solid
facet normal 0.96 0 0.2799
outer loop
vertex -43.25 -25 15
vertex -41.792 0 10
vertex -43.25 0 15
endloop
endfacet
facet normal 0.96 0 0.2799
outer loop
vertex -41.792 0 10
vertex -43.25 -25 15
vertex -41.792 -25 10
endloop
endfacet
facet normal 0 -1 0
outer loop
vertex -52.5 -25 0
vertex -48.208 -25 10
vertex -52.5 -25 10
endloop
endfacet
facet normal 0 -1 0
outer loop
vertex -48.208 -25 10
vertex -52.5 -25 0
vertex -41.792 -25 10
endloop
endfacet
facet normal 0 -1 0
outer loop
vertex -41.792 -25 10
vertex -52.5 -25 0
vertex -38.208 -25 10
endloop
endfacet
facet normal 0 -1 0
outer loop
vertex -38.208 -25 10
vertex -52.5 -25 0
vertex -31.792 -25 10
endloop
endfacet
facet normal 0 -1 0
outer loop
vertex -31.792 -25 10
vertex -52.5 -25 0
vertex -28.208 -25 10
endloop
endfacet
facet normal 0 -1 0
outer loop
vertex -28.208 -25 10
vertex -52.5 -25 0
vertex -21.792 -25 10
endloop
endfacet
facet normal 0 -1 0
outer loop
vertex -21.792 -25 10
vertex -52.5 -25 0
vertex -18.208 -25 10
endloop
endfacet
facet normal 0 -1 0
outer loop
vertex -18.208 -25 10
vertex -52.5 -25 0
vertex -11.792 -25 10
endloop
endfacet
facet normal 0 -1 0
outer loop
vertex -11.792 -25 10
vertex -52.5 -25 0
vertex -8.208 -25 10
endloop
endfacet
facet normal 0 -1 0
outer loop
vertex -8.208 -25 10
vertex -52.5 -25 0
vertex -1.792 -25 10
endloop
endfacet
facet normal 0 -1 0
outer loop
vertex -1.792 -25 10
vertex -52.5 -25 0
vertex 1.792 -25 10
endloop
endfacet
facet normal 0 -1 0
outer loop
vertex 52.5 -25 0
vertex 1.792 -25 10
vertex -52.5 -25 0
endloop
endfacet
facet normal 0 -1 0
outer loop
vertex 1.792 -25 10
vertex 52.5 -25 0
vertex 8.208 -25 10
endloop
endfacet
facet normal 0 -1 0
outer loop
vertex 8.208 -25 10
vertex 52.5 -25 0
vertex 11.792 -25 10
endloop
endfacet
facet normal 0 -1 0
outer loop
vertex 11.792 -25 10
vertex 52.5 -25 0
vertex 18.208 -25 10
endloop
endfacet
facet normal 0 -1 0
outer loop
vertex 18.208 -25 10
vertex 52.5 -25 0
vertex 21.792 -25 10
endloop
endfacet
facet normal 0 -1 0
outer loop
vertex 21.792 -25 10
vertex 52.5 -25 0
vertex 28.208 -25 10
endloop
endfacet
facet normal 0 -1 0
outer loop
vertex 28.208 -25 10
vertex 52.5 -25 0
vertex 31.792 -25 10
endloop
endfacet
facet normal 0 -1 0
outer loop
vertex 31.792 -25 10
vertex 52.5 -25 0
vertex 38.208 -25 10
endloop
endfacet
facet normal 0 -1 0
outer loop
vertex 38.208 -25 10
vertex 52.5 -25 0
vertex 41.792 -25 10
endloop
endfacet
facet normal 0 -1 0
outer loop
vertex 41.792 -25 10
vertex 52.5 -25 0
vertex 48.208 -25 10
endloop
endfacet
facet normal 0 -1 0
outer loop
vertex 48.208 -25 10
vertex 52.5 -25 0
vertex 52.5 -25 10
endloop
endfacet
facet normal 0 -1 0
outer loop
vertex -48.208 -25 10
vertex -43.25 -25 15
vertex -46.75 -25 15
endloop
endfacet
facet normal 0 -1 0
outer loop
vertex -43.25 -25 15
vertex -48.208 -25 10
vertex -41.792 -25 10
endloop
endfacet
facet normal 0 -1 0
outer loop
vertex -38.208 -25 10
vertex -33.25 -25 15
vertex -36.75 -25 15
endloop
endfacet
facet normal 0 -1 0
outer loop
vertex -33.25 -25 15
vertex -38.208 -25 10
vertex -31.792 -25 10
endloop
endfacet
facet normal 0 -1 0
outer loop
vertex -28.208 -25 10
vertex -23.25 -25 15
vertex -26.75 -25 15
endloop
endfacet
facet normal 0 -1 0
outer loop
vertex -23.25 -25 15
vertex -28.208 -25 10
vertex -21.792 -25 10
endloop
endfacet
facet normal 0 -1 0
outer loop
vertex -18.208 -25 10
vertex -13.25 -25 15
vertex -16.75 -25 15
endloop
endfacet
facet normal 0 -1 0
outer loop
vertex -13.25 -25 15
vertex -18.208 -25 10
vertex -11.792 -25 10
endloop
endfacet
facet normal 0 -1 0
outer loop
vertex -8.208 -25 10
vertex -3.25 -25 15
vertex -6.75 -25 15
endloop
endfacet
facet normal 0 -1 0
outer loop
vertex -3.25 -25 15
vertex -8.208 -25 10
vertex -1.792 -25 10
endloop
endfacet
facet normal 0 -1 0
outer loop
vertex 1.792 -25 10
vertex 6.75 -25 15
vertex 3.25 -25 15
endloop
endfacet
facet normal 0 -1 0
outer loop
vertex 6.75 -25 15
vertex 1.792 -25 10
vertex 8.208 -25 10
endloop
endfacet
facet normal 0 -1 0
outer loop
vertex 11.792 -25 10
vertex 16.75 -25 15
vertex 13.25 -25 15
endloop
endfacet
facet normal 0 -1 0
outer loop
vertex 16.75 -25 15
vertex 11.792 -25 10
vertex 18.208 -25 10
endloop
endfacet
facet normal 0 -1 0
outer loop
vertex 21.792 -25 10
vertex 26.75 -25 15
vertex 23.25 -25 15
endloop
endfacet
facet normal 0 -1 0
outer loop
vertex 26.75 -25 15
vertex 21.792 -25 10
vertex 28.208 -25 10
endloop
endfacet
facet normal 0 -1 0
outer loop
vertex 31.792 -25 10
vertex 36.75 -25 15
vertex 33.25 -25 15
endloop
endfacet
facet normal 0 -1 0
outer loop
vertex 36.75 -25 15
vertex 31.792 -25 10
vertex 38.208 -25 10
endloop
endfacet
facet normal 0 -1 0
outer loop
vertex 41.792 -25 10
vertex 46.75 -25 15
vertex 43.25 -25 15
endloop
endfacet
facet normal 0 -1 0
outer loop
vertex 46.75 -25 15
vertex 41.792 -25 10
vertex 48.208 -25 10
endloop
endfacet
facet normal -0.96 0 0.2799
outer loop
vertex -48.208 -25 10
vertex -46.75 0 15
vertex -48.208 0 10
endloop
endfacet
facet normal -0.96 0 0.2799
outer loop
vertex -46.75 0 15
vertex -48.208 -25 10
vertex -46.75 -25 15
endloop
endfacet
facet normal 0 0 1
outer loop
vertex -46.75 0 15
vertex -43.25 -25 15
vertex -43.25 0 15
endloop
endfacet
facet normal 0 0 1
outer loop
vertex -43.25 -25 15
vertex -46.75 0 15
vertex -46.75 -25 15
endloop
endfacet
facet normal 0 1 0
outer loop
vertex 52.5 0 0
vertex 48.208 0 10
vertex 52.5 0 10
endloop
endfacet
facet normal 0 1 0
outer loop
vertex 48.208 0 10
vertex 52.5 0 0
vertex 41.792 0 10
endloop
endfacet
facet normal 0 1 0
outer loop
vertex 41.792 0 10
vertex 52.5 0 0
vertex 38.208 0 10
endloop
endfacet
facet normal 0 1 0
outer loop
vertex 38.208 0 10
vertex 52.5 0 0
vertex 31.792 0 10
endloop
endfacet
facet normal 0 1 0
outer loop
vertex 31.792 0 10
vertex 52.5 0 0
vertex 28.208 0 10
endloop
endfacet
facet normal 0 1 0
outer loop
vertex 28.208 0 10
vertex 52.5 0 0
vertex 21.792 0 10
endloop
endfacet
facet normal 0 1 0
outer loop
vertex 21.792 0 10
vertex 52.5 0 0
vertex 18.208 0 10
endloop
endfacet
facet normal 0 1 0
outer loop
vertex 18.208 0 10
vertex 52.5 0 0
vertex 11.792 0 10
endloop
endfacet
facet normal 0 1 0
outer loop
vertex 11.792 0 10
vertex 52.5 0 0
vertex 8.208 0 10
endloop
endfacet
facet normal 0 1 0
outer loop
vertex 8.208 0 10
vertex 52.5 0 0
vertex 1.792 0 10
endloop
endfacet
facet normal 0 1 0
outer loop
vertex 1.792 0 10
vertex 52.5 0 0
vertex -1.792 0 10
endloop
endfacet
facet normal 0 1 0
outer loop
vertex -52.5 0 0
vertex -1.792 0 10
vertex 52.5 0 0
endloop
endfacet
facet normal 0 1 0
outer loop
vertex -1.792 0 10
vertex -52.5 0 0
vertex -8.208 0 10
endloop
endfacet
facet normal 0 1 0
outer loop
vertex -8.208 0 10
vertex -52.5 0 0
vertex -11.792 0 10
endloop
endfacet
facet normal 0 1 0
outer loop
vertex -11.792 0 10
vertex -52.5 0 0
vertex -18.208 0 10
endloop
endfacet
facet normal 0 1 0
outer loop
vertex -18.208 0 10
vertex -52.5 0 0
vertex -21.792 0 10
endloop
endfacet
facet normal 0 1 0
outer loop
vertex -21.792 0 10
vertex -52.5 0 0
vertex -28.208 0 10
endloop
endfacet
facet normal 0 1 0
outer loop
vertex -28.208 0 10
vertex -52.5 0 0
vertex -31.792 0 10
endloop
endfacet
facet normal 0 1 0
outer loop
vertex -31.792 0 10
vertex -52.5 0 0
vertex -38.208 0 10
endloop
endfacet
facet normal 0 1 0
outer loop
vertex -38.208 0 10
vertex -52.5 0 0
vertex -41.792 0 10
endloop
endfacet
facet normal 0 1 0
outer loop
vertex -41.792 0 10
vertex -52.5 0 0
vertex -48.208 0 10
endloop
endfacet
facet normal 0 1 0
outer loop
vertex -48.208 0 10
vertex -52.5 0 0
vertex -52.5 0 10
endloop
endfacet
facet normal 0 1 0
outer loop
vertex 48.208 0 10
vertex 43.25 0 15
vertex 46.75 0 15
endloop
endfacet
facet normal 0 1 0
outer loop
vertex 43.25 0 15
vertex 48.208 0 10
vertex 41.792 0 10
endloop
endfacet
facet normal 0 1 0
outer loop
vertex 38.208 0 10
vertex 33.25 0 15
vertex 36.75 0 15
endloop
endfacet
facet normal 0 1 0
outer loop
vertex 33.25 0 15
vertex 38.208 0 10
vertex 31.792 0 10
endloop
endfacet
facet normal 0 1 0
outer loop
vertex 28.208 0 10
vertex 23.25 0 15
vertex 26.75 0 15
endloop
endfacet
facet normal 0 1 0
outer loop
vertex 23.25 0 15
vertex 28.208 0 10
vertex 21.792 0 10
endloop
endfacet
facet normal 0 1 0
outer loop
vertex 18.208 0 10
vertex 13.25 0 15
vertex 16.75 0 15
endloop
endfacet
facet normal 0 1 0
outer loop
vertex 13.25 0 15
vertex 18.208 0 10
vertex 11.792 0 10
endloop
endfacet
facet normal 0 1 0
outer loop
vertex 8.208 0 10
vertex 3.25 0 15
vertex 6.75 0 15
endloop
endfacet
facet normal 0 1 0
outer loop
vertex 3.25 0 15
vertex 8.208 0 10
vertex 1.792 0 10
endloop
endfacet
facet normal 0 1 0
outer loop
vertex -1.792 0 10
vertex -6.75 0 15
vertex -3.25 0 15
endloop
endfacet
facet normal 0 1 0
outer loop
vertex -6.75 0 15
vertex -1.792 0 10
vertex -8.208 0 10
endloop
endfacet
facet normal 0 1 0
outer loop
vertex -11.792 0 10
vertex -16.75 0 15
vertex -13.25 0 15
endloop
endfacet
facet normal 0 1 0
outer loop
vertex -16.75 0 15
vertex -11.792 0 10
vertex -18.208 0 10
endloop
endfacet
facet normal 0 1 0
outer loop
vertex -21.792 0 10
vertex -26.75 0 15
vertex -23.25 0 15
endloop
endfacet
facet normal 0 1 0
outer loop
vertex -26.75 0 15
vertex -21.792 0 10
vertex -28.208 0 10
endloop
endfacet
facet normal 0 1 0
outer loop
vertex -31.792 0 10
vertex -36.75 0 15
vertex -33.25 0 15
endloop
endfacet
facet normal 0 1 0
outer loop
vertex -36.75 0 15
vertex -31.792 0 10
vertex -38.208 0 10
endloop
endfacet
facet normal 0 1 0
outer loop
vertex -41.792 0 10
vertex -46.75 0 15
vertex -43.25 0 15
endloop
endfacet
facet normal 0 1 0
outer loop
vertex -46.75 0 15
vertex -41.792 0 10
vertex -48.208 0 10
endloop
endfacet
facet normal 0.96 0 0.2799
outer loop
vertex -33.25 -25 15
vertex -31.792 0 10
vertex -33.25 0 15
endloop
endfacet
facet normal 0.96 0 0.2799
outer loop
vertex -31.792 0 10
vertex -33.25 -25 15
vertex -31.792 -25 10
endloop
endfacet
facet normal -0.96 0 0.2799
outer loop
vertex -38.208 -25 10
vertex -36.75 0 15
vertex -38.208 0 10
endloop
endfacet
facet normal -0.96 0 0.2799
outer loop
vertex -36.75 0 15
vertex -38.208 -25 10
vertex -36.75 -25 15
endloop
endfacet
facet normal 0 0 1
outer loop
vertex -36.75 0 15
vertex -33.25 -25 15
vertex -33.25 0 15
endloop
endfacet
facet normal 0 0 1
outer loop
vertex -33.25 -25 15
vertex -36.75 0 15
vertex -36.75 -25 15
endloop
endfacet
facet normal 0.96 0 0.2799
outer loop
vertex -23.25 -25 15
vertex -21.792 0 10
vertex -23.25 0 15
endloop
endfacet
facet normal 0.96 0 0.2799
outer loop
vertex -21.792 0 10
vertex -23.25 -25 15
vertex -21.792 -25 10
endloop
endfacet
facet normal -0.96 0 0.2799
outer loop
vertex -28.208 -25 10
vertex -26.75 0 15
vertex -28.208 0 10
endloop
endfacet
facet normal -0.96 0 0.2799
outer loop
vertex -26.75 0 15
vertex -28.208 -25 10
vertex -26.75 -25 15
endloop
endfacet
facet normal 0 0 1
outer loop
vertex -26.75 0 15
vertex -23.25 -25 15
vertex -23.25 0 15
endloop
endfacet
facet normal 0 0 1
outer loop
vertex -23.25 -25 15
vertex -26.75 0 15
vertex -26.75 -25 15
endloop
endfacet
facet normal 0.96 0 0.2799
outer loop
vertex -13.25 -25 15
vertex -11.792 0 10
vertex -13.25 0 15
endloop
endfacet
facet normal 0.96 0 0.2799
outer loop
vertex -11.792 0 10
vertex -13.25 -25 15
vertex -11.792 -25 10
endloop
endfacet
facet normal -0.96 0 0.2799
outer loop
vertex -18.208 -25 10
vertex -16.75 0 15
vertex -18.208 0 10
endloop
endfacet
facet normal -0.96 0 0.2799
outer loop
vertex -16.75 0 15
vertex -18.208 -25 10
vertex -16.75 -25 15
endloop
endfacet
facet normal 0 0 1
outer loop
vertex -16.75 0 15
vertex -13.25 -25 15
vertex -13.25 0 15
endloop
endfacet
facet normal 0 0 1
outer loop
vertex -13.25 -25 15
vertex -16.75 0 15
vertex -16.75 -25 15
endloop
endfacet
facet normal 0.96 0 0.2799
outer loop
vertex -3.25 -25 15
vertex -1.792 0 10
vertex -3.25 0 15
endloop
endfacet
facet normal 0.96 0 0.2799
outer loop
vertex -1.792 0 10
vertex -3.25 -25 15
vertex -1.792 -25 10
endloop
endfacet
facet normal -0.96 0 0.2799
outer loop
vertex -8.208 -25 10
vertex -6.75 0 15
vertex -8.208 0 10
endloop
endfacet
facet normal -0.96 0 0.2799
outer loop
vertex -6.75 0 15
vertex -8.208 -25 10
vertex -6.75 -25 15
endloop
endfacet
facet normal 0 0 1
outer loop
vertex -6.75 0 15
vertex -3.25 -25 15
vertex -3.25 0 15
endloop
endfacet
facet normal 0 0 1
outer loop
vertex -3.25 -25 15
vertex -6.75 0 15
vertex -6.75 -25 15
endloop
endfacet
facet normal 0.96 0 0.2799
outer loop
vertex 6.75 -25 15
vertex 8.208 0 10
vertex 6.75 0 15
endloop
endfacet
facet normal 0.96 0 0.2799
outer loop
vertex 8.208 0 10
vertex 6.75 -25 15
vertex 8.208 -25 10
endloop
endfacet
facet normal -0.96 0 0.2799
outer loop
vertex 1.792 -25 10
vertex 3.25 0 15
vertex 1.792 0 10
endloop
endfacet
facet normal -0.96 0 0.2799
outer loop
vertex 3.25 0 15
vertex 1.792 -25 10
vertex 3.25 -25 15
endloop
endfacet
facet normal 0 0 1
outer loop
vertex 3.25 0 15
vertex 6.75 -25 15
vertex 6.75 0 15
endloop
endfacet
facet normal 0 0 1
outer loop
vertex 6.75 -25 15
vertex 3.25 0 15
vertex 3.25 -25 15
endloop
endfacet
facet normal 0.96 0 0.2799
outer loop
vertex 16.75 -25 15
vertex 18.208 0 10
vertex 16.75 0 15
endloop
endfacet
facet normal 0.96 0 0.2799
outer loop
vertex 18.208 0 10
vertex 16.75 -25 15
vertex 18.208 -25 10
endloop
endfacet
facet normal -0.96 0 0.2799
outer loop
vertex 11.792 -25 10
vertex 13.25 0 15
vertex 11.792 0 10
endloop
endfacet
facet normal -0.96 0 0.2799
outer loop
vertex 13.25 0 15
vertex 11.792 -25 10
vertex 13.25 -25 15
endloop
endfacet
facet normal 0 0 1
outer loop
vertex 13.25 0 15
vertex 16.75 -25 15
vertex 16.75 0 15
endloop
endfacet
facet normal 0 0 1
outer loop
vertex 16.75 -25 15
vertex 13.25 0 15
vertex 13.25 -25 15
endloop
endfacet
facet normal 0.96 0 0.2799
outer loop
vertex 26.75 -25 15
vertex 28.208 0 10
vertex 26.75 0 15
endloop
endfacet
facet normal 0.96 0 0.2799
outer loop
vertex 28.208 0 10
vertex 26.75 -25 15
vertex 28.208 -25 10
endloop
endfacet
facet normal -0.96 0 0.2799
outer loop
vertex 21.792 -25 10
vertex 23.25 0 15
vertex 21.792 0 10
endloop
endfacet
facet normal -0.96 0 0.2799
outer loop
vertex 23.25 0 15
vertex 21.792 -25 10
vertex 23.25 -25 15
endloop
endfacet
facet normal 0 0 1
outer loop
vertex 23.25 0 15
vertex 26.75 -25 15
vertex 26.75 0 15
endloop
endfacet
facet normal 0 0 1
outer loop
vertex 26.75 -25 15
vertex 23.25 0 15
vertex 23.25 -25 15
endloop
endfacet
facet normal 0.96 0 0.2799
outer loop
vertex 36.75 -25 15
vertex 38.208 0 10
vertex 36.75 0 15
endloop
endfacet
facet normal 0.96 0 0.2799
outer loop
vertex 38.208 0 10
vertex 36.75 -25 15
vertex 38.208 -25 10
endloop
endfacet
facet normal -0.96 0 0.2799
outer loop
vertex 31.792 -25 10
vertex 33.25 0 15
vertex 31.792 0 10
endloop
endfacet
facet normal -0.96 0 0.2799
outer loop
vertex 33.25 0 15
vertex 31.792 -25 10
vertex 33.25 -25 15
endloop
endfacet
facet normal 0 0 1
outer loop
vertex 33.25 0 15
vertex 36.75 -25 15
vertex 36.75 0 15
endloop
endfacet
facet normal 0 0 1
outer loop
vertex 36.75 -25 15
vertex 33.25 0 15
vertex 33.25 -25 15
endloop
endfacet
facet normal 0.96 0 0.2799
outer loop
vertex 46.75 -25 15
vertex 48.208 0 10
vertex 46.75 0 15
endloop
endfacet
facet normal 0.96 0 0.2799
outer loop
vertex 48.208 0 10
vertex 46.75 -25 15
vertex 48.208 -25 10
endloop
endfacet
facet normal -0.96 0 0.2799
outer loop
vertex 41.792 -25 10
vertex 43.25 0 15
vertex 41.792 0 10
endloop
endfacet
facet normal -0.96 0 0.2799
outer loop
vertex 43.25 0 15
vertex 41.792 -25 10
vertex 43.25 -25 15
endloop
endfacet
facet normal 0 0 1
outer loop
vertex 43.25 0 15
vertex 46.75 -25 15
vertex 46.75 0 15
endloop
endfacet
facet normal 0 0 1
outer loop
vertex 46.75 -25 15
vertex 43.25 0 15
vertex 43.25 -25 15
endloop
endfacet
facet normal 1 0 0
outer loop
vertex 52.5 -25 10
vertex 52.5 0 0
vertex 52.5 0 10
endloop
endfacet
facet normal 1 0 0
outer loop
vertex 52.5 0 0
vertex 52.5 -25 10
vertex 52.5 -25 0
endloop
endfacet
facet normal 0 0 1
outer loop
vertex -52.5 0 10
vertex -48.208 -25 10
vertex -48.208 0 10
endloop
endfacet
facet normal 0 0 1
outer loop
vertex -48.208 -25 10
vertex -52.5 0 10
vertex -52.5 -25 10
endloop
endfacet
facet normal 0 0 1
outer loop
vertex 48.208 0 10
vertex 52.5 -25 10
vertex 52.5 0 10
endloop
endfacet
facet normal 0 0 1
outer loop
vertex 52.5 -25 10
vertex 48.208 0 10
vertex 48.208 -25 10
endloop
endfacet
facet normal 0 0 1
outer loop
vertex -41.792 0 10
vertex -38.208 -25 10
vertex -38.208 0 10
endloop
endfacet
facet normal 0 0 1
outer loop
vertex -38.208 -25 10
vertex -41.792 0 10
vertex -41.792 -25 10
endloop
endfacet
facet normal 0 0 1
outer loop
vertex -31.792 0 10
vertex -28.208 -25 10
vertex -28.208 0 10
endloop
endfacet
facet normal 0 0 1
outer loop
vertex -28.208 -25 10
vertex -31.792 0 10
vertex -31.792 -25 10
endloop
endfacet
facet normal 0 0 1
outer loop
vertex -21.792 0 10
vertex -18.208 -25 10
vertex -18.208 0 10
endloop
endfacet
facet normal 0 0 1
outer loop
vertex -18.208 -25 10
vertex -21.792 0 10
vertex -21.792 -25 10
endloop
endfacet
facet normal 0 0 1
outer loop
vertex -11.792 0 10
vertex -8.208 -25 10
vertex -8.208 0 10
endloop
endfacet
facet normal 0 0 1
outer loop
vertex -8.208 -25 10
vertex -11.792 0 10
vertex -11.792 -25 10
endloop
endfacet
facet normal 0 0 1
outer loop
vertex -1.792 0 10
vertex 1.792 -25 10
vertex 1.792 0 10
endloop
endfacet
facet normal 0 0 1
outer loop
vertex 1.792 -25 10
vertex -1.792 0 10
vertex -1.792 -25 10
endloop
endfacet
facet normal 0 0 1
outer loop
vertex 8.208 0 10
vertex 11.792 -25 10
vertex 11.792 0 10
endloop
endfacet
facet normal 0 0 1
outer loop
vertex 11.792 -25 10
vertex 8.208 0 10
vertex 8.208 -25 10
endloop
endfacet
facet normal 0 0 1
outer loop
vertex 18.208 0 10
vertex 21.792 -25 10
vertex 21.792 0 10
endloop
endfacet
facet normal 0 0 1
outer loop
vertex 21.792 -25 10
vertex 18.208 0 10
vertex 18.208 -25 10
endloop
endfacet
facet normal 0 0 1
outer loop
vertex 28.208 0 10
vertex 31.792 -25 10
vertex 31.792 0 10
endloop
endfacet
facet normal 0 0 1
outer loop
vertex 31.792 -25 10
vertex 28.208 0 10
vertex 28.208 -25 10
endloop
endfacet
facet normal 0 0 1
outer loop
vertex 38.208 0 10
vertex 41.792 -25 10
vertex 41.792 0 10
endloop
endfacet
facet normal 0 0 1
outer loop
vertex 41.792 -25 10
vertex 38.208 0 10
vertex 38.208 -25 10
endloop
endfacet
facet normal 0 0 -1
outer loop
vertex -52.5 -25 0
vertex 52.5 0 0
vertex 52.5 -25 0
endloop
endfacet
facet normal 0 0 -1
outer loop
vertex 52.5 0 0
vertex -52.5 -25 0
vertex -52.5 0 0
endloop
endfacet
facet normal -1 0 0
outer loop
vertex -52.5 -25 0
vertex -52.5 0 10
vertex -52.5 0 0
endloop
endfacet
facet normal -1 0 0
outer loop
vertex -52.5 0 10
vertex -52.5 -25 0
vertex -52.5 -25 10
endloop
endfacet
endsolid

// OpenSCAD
$fn = 32;

// ----------------------------------------------------------------------
// Toothed rack, 10 teeth
// 10 mm pitch, 5 mm teeth
// ----------------------------------------------------------------------

// --- parameters (mm) ---
bar_w = 25;     // bar width (Y)
bar_h = 10;     // bar height (Z)
teeth = 10;     // number of teeth
pitch = 10;     // tooth pitch
tooth_h = 5;    // tooth height above the bar
root_w = 7;     // tooth width at the root
crest_w = 3.5;  // tooth width at the crest

// --- derived feature positions (mm) ---
span = (teeth - 1) * pitch;  // = 90   distance between the outer teeth
bar_l = span + root_w + 8;   // = 105   bar length: teeth plus 4 mm at each end
tooth_x = -span / 2;         // = -45   X of the first tooth
height = bar_h + tooth_h;    // = 15   overall height
feature_centers = [
  [tooth_x + 0 * pitch, -bar_w / 2],
  [tooth_x + 1 * pitch, -bar_w / 2],
  [tooth_x + 2 * pitch, -bar_w / 2],
  [tooth_x + 3 * pitch, -bar_w / 2],
  [tooth_x + 4 * pitch, -bar_w / 2],
  [tooth_x + 5 * pitch, -bar_w / 2],
  [tooth_x + 6 * pitch, -bar_w / 2],
  [tooth_x + 7 * pitch, -bar_w / 2],
  [tooth_x + 8 * pitch, -bar_w / 2],
  [tooth_x + 9 * pitch, -bar_w / 2]
];   // tooth centre line, drives the tooth loop

// bar with a rack of teeth, one extruded trapezoium per centre
module rack_tooth() {
  linear_extrude(height = bar_w)
    polygon(points = [
      [0, 0],
      [root_w, 0],
      [root_w / 2 + crest_w / 2, tooth_h + 1],
      [root_w / 2 - crest_w / 2, tooth_h + 1]
    ]);
}

union() {
  translate([-bar_l / 2, -bar_w, 0]) cube([bar_l, bar_w, bar_h]);
  for (centre = feature_centers)
    translate([centre[0] - root_w / 2, 0, bar_h - 1]) rotate([90, 0, 0]) rack_tooth();
}
